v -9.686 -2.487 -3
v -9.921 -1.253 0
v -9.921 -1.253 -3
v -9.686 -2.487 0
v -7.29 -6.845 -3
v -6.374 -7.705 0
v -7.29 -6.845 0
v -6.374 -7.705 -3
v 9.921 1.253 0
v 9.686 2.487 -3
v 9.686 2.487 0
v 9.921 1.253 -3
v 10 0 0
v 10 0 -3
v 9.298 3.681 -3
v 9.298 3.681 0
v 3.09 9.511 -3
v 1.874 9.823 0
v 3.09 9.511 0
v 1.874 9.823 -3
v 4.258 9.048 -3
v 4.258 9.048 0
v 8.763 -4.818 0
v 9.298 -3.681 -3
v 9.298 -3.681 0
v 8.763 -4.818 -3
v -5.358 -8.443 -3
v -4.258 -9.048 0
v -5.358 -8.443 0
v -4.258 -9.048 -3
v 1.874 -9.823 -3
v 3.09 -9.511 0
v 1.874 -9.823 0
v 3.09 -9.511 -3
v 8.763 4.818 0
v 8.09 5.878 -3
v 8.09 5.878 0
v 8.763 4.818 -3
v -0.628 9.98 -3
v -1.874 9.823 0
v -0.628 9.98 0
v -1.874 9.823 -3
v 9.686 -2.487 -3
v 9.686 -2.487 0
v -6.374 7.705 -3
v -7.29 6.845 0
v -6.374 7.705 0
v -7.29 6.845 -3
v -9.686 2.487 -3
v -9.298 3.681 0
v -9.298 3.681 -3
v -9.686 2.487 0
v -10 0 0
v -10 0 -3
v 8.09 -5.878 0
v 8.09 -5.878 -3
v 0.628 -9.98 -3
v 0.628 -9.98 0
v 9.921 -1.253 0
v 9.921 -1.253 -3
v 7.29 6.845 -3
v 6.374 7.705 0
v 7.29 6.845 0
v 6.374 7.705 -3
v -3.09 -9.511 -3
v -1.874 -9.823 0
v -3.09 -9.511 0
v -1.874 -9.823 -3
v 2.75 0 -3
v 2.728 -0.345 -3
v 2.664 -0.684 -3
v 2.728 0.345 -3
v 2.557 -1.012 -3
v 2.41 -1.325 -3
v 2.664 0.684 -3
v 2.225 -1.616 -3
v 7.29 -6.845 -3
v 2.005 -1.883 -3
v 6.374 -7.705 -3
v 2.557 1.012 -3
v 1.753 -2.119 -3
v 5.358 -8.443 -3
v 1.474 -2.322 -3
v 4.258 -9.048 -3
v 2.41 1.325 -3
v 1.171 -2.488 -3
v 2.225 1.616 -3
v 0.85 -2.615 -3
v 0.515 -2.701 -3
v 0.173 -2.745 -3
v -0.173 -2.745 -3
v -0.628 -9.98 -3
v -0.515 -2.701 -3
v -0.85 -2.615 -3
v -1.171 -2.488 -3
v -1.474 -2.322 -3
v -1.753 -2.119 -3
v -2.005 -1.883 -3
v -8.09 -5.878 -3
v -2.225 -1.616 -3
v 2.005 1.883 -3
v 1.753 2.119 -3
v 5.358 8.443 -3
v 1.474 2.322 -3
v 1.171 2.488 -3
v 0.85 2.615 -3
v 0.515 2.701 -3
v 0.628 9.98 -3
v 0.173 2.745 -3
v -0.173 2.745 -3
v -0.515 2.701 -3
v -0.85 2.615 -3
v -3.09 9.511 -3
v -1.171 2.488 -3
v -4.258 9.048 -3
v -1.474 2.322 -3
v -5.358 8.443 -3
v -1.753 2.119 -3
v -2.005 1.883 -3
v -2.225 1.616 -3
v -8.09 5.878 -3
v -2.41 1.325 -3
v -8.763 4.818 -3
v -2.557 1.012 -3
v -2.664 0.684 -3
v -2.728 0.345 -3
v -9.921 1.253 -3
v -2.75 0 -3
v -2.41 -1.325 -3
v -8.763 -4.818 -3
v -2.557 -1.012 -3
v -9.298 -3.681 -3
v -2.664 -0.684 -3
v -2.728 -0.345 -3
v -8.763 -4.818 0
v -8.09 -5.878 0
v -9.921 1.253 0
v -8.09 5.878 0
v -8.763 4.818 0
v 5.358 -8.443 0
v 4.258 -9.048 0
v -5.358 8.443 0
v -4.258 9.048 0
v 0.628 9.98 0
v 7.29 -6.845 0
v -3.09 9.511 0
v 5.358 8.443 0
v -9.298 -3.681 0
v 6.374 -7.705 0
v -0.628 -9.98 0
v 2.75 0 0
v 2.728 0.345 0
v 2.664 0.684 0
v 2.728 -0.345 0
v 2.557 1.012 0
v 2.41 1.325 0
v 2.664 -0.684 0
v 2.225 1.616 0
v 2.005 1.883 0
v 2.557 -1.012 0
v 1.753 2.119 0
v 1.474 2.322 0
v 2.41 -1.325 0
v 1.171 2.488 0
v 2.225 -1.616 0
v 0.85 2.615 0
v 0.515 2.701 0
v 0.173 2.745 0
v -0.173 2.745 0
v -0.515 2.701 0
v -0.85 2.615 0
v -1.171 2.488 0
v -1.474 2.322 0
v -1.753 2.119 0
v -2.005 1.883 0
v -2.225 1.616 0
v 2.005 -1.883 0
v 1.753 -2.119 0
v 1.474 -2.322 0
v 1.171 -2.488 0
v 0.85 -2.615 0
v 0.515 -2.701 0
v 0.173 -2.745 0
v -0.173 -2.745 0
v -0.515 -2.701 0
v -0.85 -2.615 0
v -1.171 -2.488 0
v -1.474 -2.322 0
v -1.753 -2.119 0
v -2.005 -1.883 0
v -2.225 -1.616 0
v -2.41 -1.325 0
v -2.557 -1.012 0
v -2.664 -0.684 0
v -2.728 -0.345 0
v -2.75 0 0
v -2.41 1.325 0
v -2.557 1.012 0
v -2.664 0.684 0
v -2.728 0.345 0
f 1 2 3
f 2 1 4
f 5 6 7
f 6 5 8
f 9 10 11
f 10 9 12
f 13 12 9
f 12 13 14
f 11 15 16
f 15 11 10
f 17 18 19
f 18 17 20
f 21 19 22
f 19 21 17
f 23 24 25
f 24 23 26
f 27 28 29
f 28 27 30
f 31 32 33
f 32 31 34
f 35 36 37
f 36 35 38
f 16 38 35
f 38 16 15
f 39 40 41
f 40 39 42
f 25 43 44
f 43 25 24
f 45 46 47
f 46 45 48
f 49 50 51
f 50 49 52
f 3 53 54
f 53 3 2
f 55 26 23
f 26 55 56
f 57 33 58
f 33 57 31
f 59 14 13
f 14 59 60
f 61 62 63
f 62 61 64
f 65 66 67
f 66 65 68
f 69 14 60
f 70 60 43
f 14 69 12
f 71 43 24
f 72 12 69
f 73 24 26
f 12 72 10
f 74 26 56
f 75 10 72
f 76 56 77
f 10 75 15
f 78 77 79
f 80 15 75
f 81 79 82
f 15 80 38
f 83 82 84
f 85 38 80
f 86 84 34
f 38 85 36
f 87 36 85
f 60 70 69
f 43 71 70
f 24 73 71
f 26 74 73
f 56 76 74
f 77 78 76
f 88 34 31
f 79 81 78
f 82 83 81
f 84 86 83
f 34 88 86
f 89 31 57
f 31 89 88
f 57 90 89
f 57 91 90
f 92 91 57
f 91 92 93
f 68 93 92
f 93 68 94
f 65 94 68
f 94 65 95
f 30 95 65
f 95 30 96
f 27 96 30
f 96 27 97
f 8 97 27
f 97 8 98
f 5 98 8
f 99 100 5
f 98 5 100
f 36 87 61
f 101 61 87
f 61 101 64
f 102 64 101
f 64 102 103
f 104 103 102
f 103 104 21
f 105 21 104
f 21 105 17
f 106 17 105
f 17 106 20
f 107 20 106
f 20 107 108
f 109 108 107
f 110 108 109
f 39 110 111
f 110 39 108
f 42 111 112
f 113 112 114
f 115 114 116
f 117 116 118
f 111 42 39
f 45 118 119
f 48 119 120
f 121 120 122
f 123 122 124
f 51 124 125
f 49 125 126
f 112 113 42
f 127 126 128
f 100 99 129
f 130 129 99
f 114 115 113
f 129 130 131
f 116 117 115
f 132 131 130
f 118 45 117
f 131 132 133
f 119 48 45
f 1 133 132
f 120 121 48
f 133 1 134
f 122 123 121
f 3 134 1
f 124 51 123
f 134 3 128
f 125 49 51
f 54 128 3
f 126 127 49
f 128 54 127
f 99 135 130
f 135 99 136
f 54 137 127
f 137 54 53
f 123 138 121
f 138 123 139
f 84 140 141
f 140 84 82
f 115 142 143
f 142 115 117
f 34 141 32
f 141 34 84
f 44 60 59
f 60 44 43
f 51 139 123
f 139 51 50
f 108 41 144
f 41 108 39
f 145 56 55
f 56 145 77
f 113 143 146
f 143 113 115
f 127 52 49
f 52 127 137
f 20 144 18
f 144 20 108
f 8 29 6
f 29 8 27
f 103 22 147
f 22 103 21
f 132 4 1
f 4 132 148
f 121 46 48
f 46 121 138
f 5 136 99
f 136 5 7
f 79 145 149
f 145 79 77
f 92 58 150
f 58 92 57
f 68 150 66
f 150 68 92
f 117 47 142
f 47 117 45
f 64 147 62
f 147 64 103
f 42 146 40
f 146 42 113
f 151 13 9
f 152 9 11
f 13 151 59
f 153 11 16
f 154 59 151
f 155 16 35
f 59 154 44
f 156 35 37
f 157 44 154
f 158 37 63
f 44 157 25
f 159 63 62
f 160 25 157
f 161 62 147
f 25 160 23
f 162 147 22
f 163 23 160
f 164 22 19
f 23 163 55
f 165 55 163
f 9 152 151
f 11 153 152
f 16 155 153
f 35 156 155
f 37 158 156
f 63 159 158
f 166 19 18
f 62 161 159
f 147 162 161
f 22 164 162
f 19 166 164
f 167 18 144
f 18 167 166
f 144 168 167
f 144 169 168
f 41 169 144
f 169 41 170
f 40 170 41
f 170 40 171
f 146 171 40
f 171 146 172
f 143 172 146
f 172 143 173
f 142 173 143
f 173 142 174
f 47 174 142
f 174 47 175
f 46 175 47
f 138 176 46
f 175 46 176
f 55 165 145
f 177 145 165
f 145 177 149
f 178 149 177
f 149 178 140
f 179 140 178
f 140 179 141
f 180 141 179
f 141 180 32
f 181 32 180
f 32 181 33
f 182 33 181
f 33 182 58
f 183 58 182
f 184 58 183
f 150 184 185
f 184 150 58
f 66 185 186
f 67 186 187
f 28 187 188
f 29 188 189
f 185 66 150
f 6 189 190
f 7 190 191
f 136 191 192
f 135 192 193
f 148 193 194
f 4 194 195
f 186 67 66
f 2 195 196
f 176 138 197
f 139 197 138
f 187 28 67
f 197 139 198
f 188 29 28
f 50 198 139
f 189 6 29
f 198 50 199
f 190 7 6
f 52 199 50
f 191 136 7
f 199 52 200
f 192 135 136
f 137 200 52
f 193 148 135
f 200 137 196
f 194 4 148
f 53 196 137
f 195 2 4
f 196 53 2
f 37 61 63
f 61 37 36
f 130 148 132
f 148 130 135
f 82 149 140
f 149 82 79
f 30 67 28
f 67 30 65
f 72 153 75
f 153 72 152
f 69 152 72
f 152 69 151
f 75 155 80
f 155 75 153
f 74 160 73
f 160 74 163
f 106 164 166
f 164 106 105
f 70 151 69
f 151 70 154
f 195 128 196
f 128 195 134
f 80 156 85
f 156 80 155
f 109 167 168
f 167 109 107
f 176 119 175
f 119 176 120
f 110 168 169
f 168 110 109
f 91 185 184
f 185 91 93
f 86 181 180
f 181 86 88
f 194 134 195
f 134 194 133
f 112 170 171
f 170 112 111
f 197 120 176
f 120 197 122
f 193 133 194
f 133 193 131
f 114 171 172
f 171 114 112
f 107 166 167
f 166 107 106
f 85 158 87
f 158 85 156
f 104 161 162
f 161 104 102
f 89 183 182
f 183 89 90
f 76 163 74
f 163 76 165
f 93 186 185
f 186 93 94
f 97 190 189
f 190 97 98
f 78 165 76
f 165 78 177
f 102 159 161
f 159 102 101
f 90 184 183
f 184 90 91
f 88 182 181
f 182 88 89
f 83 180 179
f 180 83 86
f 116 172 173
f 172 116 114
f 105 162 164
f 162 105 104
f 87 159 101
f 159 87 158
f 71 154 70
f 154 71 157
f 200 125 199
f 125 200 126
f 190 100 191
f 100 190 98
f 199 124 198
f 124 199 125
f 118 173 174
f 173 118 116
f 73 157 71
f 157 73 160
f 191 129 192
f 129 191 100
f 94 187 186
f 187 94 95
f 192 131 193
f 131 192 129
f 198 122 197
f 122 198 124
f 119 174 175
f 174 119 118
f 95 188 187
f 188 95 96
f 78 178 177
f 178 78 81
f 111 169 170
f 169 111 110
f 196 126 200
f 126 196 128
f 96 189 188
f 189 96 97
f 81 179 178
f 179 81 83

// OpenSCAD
$fn = 50;


difference() {
	union() {
		translate(v = [0, 0, -3.0000000000]) {
			cylinder(h = 3, r = 10.0000000000);
		}
	}
	union() {
		#translate(v = [0, 0, -3]) {
			cylinder(h = 3, r = 2.7500000000);
		}
	}
}
